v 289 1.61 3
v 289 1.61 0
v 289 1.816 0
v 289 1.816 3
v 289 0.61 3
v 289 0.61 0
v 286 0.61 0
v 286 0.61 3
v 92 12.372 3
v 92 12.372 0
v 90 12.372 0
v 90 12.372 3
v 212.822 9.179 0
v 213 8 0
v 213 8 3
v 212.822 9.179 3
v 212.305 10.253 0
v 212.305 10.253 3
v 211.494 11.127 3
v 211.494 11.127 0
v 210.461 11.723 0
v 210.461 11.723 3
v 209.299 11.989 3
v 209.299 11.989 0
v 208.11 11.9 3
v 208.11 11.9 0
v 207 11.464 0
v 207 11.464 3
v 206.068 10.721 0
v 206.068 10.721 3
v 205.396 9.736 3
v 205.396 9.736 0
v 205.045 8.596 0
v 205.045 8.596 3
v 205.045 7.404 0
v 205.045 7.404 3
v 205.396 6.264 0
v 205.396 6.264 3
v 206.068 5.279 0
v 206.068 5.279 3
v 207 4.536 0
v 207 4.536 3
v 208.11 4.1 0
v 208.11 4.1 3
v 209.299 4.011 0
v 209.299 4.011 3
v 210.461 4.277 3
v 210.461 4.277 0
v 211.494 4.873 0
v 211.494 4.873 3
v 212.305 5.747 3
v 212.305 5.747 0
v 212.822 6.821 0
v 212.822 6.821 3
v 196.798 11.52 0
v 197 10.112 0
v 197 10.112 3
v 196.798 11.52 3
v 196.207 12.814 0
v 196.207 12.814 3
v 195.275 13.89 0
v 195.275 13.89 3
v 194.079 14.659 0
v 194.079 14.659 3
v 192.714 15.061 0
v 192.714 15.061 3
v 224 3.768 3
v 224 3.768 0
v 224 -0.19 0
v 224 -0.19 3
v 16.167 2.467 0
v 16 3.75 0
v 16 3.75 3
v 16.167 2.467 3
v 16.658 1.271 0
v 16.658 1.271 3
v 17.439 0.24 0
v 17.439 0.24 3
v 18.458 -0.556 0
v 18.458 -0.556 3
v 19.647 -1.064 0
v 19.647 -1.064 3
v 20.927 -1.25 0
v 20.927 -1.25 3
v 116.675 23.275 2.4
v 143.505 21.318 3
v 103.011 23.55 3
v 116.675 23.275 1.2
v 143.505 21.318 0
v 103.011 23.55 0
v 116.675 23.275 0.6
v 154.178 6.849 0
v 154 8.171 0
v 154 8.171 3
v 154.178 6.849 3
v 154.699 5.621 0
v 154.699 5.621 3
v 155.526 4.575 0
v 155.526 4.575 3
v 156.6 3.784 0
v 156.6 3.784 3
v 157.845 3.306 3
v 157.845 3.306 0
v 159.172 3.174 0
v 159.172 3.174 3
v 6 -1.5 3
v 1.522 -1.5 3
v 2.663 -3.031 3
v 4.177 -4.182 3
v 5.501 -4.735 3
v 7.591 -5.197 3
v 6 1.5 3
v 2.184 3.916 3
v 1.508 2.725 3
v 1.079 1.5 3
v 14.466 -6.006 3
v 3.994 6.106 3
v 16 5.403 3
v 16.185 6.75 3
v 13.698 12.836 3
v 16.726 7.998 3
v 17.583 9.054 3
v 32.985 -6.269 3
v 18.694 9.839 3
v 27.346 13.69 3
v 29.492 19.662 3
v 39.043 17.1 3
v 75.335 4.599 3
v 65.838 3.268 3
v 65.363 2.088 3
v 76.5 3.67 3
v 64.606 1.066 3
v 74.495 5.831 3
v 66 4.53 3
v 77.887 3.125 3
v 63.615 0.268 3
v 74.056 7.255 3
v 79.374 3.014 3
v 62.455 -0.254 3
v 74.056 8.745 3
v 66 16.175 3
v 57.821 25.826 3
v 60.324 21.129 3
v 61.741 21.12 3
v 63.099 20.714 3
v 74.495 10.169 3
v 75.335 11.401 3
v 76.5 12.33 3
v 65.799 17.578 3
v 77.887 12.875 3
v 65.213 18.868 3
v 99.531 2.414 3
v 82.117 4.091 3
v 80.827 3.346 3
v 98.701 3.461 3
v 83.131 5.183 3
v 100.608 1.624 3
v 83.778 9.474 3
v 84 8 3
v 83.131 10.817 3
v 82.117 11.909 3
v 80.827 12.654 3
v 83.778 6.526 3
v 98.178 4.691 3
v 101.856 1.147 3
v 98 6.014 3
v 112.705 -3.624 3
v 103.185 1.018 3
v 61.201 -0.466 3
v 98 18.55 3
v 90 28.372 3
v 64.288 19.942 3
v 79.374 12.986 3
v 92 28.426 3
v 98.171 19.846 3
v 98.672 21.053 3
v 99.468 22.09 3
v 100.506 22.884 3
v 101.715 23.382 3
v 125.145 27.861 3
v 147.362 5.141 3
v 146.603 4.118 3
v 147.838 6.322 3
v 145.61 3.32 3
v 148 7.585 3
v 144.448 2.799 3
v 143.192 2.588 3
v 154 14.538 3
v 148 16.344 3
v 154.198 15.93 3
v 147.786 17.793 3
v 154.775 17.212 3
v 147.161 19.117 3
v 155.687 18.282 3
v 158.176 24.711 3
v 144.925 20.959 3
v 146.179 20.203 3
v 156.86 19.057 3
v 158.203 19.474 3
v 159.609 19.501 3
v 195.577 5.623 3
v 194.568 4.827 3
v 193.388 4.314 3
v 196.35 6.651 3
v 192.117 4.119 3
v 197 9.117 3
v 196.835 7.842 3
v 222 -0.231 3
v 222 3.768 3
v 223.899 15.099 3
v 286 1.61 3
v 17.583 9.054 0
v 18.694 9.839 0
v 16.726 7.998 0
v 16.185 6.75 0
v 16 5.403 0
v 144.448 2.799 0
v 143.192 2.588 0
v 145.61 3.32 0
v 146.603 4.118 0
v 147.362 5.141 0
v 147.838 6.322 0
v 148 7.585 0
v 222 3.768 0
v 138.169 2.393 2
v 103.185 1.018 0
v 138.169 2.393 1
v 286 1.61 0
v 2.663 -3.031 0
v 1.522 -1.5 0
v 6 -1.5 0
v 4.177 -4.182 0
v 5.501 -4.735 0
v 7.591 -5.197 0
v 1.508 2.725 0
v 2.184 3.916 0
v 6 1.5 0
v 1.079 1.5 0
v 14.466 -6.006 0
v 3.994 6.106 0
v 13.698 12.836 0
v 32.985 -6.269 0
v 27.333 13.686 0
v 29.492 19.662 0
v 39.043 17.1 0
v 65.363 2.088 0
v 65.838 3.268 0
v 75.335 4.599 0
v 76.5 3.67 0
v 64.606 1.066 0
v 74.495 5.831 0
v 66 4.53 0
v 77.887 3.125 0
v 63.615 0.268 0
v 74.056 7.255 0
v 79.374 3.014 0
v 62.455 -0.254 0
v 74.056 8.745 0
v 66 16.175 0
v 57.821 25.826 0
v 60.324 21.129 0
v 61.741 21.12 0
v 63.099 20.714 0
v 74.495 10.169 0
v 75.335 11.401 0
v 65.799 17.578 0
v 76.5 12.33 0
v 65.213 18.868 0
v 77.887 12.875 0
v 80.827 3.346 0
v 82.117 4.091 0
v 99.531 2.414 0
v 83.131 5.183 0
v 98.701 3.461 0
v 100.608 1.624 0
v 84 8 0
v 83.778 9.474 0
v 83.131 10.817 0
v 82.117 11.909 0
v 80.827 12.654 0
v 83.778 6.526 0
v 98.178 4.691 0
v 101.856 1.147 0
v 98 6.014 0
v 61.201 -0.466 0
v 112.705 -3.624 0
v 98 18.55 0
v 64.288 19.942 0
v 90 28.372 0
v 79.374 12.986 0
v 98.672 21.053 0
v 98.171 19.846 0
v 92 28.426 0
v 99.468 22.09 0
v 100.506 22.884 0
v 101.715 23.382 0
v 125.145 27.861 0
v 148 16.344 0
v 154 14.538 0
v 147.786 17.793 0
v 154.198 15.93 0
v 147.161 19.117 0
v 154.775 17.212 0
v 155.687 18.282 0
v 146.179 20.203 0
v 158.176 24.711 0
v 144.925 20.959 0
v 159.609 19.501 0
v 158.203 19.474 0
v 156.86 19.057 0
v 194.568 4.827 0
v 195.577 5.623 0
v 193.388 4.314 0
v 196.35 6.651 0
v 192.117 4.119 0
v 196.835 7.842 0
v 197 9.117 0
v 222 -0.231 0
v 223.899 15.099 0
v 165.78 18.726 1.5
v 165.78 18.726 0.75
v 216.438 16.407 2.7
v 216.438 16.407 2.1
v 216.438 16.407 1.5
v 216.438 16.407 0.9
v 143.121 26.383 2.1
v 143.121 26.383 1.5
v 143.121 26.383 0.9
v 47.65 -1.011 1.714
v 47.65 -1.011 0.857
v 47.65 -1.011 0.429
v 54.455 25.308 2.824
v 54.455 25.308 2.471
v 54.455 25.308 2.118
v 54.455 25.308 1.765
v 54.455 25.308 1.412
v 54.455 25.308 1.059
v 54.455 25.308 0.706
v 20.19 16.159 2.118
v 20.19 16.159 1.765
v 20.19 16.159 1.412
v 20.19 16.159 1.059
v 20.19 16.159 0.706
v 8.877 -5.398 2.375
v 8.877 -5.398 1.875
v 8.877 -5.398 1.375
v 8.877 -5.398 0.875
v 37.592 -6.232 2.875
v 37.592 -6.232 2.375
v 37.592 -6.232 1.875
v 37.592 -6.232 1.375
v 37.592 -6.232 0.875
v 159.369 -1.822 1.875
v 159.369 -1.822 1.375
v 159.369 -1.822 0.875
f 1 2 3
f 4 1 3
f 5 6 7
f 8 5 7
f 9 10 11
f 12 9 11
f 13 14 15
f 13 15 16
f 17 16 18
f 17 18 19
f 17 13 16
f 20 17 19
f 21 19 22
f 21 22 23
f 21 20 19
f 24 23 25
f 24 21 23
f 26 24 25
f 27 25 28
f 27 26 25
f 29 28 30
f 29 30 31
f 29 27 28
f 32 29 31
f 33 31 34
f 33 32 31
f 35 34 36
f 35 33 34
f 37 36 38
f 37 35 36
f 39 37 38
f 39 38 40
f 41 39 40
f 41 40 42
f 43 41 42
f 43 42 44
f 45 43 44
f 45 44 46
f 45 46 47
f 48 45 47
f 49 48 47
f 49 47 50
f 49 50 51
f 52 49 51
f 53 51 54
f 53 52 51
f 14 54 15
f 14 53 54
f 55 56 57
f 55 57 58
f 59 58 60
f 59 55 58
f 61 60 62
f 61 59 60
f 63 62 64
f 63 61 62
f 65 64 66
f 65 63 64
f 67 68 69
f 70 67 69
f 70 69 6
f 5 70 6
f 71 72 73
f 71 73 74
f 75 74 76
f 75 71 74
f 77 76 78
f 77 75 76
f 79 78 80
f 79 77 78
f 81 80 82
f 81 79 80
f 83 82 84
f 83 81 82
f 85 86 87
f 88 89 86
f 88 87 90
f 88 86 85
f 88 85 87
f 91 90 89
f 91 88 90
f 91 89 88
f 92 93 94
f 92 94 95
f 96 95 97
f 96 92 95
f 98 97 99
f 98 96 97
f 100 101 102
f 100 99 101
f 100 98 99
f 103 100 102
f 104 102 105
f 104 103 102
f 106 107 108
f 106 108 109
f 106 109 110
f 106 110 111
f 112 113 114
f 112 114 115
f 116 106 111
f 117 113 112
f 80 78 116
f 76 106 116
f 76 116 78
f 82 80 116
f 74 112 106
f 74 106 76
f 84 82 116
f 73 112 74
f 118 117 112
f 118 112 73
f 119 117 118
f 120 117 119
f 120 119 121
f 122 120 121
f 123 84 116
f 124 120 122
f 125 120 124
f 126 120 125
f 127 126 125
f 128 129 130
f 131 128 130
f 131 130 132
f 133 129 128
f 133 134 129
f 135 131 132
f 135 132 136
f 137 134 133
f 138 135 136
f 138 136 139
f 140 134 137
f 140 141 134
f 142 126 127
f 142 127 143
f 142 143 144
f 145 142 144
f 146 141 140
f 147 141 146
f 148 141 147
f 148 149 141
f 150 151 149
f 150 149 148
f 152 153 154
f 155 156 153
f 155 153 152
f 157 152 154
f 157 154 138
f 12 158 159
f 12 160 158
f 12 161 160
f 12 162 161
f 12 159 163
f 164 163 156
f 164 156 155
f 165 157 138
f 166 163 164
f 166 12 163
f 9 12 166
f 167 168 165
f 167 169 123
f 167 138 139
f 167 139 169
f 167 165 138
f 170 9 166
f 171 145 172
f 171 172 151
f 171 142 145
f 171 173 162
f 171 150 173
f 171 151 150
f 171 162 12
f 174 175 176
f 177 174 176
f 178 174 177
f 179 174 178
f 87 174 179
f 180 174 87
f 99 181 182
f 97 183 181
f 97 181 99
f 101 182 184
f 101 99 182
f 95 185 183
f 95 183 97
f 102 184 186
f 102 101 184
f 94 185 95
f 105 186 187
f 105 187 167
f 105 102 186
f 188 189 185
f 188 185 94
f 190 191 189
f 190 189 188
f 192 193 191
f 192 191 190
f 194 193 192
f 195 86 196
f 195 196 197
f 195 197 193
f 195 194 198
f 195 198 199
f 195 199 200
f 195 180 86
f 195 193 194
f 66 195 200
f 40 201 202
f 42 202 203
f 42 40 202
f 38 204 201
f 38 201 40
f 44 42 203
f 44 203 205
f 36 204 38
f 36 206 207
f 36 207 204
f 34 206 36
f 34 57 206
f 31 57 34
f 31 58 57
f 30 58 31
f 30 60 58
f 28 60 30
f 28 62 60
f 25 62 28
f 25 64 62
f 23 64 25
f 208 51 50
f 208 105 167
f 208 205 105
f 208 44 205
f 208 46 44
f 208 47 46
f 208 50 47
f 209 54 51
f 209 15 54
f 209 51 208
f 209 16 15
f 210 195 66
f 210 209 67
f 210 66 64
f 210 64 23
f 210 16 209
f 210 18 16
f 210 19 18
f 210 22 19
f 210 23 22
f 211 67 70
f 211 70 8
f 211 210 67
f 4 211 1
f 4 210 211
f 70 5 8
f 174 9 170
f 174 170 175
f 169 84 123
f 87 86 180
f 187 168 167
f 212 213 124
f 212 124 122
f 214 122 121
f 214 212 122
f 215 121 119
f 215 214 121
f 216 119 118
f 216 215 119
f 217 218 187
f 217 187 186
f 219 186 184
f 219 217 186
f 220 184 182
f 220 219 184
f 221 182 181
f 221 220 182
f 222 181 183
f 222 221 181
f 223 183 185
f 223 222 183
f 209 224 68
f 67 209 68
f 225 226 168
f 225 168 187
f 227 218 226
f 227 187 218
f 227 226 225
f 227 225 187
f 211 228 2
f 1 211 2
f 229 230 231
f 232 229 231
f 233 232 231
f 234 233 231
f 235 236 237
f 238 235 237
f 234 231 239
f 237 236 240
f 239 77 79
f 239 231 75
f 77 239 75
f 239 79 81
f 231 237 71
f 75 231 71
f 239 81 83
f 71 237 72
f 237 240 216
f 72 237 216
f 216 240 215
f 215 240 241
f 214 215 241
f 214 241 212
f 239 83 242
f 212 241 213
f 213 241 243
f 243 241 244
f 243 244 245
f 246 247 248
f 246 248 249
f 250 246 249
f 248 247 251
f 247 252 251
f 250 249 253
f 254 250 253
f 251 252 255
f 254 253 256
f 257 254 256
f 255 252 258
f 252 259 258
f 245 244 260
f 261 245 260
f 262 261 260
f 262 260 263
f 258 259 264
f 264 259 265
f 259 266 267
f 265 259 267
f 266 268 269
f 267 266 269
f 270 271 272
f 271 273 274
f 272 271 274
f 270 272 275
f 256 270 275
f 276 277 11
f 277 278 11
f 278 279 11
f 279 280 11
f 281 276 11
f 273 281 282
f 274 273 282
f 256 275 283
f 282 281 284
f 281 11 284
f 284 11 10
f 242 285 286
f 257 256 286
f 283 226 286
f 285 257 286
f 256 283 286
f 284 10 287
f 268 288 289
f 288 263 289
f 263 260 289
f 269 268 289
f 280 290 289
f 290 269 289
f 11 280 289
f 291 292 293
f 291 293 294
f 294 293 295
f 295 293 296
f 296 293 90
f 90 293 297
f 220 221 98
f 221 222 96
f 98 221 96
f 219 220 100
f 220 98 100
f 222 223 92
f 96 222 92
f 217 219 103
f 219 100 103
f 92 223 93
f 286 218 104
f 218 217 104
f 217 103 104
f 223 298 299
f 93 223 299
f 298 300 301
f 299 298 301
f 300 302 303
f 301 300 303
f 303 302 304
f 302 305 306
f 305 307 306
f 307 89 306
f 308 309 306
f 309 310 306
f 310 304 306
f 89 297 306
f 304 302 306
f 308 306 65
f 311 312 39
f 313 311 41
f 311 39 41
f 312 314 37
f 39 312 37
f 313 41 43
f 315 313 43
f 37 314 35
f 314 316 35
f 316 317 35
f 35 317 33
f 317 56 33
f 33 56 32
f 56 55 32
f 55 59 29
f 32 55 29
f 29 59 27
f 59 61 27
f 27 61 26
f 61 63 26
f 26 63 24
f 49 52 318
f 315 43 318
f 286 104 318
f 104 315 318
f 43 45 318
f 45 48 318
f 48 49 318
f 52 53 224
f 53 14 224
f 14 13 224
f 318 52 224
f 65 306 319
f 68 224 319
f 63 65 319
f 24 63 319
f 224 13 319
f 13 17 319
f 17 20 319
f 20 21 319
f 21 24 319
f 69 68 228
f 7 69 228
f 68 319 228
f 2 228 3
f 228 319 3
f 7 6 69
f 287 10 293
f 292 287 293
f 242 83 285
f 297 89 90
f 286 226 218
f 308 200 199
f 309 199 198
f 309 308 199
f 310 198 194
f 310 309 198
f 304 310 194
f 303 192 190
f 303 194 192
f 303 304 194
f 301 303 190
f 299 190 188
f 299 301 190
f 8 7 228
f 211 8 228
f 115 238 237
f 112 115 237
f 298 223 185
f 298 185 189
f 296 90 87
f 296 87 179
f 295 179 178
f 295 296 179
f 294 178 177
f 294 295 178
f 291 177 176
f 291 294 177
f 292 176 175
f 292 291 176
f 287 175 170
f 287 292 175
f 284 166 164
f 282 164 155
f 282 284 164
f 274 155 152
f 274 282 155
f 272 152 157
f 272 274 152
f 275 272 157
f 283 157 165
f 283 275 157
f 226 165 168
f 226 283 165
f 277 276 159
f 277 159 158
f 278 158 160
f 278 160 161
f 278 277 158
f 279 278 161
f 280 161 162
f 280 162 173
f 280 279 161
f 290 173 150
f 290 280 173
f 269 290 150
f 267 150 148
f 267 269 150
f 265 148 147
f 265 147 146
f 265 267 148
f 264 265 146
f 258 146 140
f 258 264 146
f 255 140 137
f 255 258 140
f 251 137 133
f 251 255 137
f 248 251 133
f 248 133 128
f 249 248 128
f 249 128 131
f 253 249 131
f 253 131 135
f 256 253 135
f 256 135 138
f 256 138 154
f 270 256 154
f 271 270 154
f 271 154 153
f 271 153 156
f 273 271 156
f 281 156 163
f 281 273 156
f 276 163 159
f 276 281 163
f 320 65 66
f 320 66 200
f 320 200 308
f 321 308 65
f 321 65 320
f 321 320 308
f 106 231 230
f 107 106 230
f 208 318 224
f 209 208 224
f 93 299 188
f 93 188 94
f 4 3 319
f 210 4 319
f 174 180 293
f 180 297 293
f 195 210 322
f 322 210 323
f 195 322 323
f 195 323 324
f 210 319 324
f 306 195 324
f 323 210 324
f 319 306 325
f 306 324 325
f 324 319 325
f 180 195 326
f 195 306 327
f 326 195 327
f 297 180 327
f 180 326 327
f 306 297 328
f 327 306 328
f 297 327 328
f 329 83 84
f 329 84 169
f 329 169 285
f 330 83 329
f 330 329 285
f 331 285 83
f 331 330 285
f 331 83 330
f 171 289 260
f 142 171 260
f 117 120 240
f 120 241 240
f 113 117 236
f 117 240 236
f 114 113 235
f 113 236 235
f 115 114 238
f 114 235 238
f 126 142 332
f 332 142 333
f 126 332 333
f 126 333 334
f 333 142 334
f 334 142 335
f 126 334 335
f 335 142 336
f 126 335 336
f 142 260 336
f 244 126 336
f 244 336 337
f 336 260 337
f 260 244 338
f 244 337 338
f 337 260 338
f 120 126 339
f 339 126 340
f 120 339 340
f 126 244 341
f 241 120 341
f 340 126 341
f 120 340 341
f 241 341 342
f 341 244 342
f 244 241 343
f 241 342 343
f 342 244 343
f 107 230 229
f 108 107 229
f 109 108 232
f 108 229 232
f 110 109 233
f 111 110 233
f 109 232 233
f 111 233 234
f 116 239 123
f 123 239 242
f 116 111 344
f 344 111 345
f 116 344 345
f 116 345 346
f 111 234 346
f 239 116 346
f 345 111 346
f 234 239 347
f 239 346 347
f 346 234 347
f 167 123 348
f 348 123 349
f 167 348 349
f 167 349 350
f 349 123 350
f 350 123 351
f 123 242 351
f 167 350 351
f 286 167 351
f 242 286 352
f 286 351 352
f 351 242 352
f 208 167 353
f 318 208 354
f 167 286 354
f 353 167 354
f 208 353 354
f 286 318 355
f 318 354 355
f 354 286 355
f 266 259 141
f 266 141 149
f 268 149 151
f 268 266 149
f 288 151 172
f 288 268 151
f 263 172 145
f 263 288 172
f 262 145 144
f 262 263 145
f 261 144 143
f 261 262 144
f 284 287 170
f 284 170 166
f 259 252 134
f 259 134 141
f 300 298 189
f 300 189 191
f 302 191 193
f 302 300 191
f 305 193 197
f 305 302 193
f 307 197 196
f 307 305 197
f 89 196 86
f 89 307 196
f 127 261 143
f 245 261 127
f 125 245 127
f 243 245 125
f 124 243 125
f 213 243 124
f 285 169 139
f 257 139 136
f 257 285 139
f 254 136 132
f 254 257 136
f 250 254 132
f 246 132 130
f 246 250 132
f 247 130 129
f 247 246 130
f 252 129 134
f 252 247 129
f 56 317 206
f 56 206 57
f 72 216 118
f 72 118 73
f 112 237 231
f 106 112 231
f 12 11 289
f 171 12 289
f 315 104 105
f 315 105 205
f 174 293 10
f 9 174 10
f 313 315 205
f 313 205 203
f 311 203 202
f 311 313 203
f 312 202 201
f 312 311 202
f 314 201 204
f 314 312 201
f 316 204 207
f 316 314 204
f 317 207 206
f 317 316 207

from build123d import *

# Parameters (mm, degrees)
SKETCH_1_R          = 5
SKETCH_1_R_2        = 4
EXTRUDE_1_DEPTH     = 3
CUT_EXTRUDE_2_DEPTH = 291.422386836


with BuildPart() as part:
    # 草图1 → 凸台-拉伸1 (new body)
    with BuildSketch(Plane.XY):
        with BuildLine():
            Line((90, 12.3715), (90, 28.372426217))
            add(Edge.make_bspline(
                [(90, 28.372426217), (89.259446982, 28.350928743), (82.363996343, 28.13322439), (72.403347361, 27.586524792), (60.185862052, 26.226268085), (51.080991088, 24.79810862), (42.033943524, 23.000087944), (34.581994337, 21.174922903), (28.697351661, 19.44563851), (24.361981086, 17.983441115), (20.174828998, 16.207949367), (16.078941989, 14.139912989), (12.040296713, 11.946766626), (8.14011433, 9.56039573), (5.153679337, 7.316395724), (3.100060439, 5.200618052), (1.813825976, 3.470730924), (1.237398467, 2.180506339), (1.085380705, 1.529058937), (1.078882286, 1.5)],
                knots=[0.345773533, 0.345773533, 0.345773533, 0.345773533, 0.349398211, 0.379527288, 0.394591827, 0.409656366, 0.424720905, 0.439785444, 0.447317713, 0.454849983, 0.462382252, 0.469914522, 0.477446791, 0.484979061, 0.49251133, 0.496277465, 0.5000436, 0.503809734, 0.503985678, 0.503985678, 0.503985678, 0.503985678], degree=3))
            Line((1.078882286, 1.5), (6, 1.5))
            Line((6, 1.5), (6, -1.5))
            Line((6, -1.5), (1.522379628, -1.5))
            add(Edge.make_bspline(
                [(1.522379628, -1.5), (1.617903461, -1.678770523), (2.068186491, -2.42442122), (3.143139608, -3.601090845), (4.854253, -4.619355756), (6.927567017, -5.105597911), (9.209034621, -5.454839075), (12.219971865, -5.84289763), (16.020132359, -6.14266222), (20.609524976, -6.2611368), (25.231457517, -6.286948592), (31.397380169, -6.280305851), (39.107274969, -6.240736398), (48.336813051, -6.022096429), (57.579935967, -5.612990736), (66.840654471, -5.242934226), (76.096556555, -4.921715721), (88.435998513, -4.515955408), (103.853120896, -3.973102953), (122.354625015, -3.248110744), (140.857835973, -2.495489966), (159.368527813, -1.804089638), (177.884173919, -1.222493213), (196.4033921, -0.774877257), (211.106034353, -0.46143934), (219.638958118, -0.28014938), (222, -0.231405833)],
                knots=[0.510182255, 0.510182255, 0.510182255, 0.510182255, 0.511342004, 0.515108139, 0.518874273, 0.522640408, 0.526406543, 0.530172677, 0.537704947, 0.545237216, 0.552769486, 0.560301755, 0.575366294, 0.590430833, 0.605495372, 0.620559911, 0.63562445, 0.650688989, 0.680818067, 0.710947144, 0.741076222, 0.7712053, 0.801334378, 0.831463456, 0.861592533, 0.873117312, 0.873117312, 0.873117312, 0.873117312], degree=3))
            Line((222, -0.231405833), (222, 3.768284765))
            Line((222, 3.768284765), (224, 3.768284765))
            Line((224, 3.768284765), (224, -0.190486213))
            add(Edge.make_bspline(
                [(224, -0.190486213), (227.14486696, -0.126773539), (236.463303784, 0.052517956), (251.961175933, 0.256656825), (270.471854229, 0.429163033), (282.824771355, 0.587434741), (289, 0.610062865)],
                knots=[0.8763714, 0.8763714, 0.8763714, 0.8763714, 0.891721611, 0.921850689, 0.951979767, 0.982108845, 0.982108845, 0.982108845, 0.982108845], degree=3))
            Line((289, 0.610062865), (286, 0.610062865))
            Line((286, 0.610062865), (286, 1.610062865))
            Line((286, 1.610062865), (289, 1.610062865))
            Line((289, 1.610062865), (289, 1.816246039))
            add(Edge.make_bspline(
                [(289, 1.816246039), (276.957314444, 4.502285023), (258.861554155, 8.397620333), (234.648247971, 13.152786595), (216.448478593, 16.478914183), (198.182873559, 19.371550405), (179.850571346, 21.924148488), (161.503162682, 24.358614825), (143.127892269, 26.473190985), (124.712239059, 28.043780086), (107.661076739, 28.627794226), (96.749283398, 28.541845307), (92, 28.425883181)],
                knots=[0.017978355, 0.017978355, 0.017978355, 0.017978355, 0.07823651, 0.108365588, 0.138494666, 0.168623744, 0.198752821, 0.228881899, 0.259010977, 0.289140055, 0.319269133, 0.342510787, 0.342510787, 0.342510787, 0.342510787], degree=3))
            Line((92, 28.425883181), (92, 12.3715))
            Line((92, 12.3715), (90, 12.3715))
        make_face()
        with Locations((79, 8)):
            Circle(SKETCH_1_R, mode=Mode.SUBTRACT)
        with Locations((209, 8)):
            Circle(SKETCH_1_R_2, mode=Mode.SUBTRACT)
    extrude(amount=EXTRUDE_1_DEPTH)

    # 草图3 → 切除-拉伸2 (cut, through all)
    with BuildSketch(Plane.XY):
        with BuildLine():
            Line((16, 5.402967421), (16, 3.749572283))
            ThreePointArc((16, 3.749572283), (17.43862744, 0.240067263), (20.926650195, -1.249889668))
            add(Edge.make_bspline(
                [(20.926650195, -1.249889668), (21.774172276, -1.262324122), (22.628944162, -1.270076322), (24.631357544, -1.281688823), (25.78455057, -1.283642157), (29.246278981, -1.283863887), (31.564498991, -1.277624199), (36.178821914, -1.249716978), (38.477208261, -1.225805817), (43.065916773, -1.143353772), (45.357830447, -1.085798853), (49.942071524, -0.935363079), (52.243600435, -0.841029597), (56.765262425, -0.649905427), (58.983967723, -0.555595534), (61.201389306, -0.466209999)],
                knots=[0.097664849, 0.097664849, 0.097664849, 0.097664849, 0.109375, 0.109375, 0.125, 0.125, 0.15625, 0.15625, 0.1875, 0.1875, 0.21875, 0.21875, 0.25, 0.25, 0.279748342, 0.279748342, 0.279748342, 0.279748342], degree=3))
            ThreePointArc((61.201389306, -0.466209999), (64.606032897, 1.066132334), (65.999999998, 4.529732589))
            Line((65.999999998, 4.529732589), (65.999999998, 16.175207171))
            ThreePointArc((65.999999998, 16.175207171), (64.287676461, 19.942325894), (60.323526607, 21.129234195))
            add(Edge.make_bspline(
                [(60.323526607, 21.129234195), (59.14328274, 20.968071656), (57.964431767, 20.796736398), (53.109249428, 20.046773379), (49.445857595, 19.384253181), (42.158673028, 17.868714577), (38.533379611, 17.019586343), (33.148990447, 15.546220745), (31.362942012, 15.022439399), (27.821005995, 13.880218625), (26.067238608, 13.253271835), (22.635818059, 11.812670552), (20.957942753, 11.004847704), (19.099592195, 10.049689097), (18.896441621, 9.944700093), (18.693547477, 9.839213217)],
                knots=[0.029920383, 0.029920383, 0.029920383, 0.029920383, 0.033494004, 0.033494004, 0.044658672, 0.044658672, 0.05582334, 0.05582334, 0.061405674, 0.061405674, 0.066988008, 0.066988008, 0.072570342, 0.072570342, 0.073256353, 0.073256353, 0.073256353, 0.073256353], degree=3))
            ThreePointArc((18.693547477, 9.839213217), (16.726110517, 7.997937304), (16, 5.402967421))
        make_face()
        with BuildLine():
            Line((98, 18.550079988), (98, 6.014495108))
            ThreePointArc((98, 6.014495108), (99.530624101, 2.414018629), (103.18537235, 1.01793258))
            add(Edge.make_bspline(
                [(103.18537235, 1.01793258), (105.560867454, 1.106063391), (107.936437779, 1.195881883), (119.590927656, 1.6441911), (128.873439493, 2.026235766), (139.842898274, 2.458620096), (141.517508234, 2.523944638), (143.192405577, 2.588444329)],
                knots=[0.467989967, 0.467989967, 0.467989967, 0.467989967, 0.5, 0.5, 0.625, 0.625, 0.647515554, 0.647515554, 0.647515554, 0.647515554], degree=3))
            ThreePointArc((143.192405577, 2.588444329), (146.602917421, 4.117900034), (148, 7.584740967))
            Line((148, 7.584740967), (148, 16.344040065))
            ThreePointArc((148, 16.344040065), (146.709868743, 19.696184738), (143.505250436, 21.318446763))
            add(Edge.make_bspline(
                [(143.505250436, 21.318446763), (142.733269268, 21.396856882), (141.961371617, 21.473825477), (137.095631637, 21.949495859), (133.006687672, 22.305846232), (124.838758232, 22.891937538), (120.76027081, 23.118394336), (112.589349819, 23.431909041), (108.50024347, 23.520641418), (103.942207816, 23.54715361), (103.476725809, 23.549024612), (103.011200556, 23.550067443)],
                knots=[0.738217106, 0.738217106, 0.738217106, 0.738217106, 0.75, 0.75, 0.8125, 0.8125, 0.875, 0.875, 0.9375, 0.9375, 0.944607852, 0.944607852, 0.944607852, 0.944607852], degree=3))
            ThreePointArc((103.011200556, 23.550067443), (99.468428309, 22.089571673), (98, 18.550079988))
        make_face()
        with BuildLine():
            Line((154, 14.537684078), (154, 8.170617563))
            ThreePointArc((154, 8.170617563), (155.525809704, 4.574786396), (159.172000715, 3.173576864))
            add(Edge.make_bspline(
                [(159.172000715, 3.173576864), (161.473677828, 3.252801775), (163.775686209, 3.329549926), (170.732455506, 3.552774746), (175.388689917, 3.690754395), (184.07020031, 3.924521784), (188.094738333, 4.024115619), (192.117455336, 4.118639618)],
                knots=[0.71908585, 0.71908585, 0.71908585, 0.71908585, 0.75, 0.75, 0.8125, 0.8125, 0.866546799, 0.866546799, 0.866546799, 0.866546799], degree=3))
            ThreePointArc((192.117455336, 4.118639618), (195.576819584, 5.623499462), (197, 9.117259852))
            Line((197, 9.117259852), (197, 10.112022474))
            ThreePointArc((197, 10.112022474), (195.77958016, 13.385365385), (192.714090476, 15.060767244))
            add(Edge.make_bspline(
                [(192.714090476, 15.060767244), (191.944613201, 15.171800732), (191.174825659, 15.282099728), (186.308954619, 15.974755997), (182.203786583, 16.539615577), (173.988030512, 17.653320176), (169.883033971, 18.199812389), (163.72254432, 18.989569369), (161.665308348, 19.2482867), (159.608604404, 19.500505924)],
                knots=[0.488248297, 0.488248297, 0.488248297, 0.488248297, 0.5, 0.5, 0.5625, 0.5625, 0.625, 0.625, 0.656347088, 0.656347088, 0.656347088, 0.656347088], degree=3))
            ThreePointArc((159.608604404, 19.500505924), (155.686619703, 18.282214891), (154, 14.537684078))
        make_face()
    extrude(amount=CUT_EXTRUDE_2_DEPTH, mode=Mode.SUBTRACT)


solid = part.part
